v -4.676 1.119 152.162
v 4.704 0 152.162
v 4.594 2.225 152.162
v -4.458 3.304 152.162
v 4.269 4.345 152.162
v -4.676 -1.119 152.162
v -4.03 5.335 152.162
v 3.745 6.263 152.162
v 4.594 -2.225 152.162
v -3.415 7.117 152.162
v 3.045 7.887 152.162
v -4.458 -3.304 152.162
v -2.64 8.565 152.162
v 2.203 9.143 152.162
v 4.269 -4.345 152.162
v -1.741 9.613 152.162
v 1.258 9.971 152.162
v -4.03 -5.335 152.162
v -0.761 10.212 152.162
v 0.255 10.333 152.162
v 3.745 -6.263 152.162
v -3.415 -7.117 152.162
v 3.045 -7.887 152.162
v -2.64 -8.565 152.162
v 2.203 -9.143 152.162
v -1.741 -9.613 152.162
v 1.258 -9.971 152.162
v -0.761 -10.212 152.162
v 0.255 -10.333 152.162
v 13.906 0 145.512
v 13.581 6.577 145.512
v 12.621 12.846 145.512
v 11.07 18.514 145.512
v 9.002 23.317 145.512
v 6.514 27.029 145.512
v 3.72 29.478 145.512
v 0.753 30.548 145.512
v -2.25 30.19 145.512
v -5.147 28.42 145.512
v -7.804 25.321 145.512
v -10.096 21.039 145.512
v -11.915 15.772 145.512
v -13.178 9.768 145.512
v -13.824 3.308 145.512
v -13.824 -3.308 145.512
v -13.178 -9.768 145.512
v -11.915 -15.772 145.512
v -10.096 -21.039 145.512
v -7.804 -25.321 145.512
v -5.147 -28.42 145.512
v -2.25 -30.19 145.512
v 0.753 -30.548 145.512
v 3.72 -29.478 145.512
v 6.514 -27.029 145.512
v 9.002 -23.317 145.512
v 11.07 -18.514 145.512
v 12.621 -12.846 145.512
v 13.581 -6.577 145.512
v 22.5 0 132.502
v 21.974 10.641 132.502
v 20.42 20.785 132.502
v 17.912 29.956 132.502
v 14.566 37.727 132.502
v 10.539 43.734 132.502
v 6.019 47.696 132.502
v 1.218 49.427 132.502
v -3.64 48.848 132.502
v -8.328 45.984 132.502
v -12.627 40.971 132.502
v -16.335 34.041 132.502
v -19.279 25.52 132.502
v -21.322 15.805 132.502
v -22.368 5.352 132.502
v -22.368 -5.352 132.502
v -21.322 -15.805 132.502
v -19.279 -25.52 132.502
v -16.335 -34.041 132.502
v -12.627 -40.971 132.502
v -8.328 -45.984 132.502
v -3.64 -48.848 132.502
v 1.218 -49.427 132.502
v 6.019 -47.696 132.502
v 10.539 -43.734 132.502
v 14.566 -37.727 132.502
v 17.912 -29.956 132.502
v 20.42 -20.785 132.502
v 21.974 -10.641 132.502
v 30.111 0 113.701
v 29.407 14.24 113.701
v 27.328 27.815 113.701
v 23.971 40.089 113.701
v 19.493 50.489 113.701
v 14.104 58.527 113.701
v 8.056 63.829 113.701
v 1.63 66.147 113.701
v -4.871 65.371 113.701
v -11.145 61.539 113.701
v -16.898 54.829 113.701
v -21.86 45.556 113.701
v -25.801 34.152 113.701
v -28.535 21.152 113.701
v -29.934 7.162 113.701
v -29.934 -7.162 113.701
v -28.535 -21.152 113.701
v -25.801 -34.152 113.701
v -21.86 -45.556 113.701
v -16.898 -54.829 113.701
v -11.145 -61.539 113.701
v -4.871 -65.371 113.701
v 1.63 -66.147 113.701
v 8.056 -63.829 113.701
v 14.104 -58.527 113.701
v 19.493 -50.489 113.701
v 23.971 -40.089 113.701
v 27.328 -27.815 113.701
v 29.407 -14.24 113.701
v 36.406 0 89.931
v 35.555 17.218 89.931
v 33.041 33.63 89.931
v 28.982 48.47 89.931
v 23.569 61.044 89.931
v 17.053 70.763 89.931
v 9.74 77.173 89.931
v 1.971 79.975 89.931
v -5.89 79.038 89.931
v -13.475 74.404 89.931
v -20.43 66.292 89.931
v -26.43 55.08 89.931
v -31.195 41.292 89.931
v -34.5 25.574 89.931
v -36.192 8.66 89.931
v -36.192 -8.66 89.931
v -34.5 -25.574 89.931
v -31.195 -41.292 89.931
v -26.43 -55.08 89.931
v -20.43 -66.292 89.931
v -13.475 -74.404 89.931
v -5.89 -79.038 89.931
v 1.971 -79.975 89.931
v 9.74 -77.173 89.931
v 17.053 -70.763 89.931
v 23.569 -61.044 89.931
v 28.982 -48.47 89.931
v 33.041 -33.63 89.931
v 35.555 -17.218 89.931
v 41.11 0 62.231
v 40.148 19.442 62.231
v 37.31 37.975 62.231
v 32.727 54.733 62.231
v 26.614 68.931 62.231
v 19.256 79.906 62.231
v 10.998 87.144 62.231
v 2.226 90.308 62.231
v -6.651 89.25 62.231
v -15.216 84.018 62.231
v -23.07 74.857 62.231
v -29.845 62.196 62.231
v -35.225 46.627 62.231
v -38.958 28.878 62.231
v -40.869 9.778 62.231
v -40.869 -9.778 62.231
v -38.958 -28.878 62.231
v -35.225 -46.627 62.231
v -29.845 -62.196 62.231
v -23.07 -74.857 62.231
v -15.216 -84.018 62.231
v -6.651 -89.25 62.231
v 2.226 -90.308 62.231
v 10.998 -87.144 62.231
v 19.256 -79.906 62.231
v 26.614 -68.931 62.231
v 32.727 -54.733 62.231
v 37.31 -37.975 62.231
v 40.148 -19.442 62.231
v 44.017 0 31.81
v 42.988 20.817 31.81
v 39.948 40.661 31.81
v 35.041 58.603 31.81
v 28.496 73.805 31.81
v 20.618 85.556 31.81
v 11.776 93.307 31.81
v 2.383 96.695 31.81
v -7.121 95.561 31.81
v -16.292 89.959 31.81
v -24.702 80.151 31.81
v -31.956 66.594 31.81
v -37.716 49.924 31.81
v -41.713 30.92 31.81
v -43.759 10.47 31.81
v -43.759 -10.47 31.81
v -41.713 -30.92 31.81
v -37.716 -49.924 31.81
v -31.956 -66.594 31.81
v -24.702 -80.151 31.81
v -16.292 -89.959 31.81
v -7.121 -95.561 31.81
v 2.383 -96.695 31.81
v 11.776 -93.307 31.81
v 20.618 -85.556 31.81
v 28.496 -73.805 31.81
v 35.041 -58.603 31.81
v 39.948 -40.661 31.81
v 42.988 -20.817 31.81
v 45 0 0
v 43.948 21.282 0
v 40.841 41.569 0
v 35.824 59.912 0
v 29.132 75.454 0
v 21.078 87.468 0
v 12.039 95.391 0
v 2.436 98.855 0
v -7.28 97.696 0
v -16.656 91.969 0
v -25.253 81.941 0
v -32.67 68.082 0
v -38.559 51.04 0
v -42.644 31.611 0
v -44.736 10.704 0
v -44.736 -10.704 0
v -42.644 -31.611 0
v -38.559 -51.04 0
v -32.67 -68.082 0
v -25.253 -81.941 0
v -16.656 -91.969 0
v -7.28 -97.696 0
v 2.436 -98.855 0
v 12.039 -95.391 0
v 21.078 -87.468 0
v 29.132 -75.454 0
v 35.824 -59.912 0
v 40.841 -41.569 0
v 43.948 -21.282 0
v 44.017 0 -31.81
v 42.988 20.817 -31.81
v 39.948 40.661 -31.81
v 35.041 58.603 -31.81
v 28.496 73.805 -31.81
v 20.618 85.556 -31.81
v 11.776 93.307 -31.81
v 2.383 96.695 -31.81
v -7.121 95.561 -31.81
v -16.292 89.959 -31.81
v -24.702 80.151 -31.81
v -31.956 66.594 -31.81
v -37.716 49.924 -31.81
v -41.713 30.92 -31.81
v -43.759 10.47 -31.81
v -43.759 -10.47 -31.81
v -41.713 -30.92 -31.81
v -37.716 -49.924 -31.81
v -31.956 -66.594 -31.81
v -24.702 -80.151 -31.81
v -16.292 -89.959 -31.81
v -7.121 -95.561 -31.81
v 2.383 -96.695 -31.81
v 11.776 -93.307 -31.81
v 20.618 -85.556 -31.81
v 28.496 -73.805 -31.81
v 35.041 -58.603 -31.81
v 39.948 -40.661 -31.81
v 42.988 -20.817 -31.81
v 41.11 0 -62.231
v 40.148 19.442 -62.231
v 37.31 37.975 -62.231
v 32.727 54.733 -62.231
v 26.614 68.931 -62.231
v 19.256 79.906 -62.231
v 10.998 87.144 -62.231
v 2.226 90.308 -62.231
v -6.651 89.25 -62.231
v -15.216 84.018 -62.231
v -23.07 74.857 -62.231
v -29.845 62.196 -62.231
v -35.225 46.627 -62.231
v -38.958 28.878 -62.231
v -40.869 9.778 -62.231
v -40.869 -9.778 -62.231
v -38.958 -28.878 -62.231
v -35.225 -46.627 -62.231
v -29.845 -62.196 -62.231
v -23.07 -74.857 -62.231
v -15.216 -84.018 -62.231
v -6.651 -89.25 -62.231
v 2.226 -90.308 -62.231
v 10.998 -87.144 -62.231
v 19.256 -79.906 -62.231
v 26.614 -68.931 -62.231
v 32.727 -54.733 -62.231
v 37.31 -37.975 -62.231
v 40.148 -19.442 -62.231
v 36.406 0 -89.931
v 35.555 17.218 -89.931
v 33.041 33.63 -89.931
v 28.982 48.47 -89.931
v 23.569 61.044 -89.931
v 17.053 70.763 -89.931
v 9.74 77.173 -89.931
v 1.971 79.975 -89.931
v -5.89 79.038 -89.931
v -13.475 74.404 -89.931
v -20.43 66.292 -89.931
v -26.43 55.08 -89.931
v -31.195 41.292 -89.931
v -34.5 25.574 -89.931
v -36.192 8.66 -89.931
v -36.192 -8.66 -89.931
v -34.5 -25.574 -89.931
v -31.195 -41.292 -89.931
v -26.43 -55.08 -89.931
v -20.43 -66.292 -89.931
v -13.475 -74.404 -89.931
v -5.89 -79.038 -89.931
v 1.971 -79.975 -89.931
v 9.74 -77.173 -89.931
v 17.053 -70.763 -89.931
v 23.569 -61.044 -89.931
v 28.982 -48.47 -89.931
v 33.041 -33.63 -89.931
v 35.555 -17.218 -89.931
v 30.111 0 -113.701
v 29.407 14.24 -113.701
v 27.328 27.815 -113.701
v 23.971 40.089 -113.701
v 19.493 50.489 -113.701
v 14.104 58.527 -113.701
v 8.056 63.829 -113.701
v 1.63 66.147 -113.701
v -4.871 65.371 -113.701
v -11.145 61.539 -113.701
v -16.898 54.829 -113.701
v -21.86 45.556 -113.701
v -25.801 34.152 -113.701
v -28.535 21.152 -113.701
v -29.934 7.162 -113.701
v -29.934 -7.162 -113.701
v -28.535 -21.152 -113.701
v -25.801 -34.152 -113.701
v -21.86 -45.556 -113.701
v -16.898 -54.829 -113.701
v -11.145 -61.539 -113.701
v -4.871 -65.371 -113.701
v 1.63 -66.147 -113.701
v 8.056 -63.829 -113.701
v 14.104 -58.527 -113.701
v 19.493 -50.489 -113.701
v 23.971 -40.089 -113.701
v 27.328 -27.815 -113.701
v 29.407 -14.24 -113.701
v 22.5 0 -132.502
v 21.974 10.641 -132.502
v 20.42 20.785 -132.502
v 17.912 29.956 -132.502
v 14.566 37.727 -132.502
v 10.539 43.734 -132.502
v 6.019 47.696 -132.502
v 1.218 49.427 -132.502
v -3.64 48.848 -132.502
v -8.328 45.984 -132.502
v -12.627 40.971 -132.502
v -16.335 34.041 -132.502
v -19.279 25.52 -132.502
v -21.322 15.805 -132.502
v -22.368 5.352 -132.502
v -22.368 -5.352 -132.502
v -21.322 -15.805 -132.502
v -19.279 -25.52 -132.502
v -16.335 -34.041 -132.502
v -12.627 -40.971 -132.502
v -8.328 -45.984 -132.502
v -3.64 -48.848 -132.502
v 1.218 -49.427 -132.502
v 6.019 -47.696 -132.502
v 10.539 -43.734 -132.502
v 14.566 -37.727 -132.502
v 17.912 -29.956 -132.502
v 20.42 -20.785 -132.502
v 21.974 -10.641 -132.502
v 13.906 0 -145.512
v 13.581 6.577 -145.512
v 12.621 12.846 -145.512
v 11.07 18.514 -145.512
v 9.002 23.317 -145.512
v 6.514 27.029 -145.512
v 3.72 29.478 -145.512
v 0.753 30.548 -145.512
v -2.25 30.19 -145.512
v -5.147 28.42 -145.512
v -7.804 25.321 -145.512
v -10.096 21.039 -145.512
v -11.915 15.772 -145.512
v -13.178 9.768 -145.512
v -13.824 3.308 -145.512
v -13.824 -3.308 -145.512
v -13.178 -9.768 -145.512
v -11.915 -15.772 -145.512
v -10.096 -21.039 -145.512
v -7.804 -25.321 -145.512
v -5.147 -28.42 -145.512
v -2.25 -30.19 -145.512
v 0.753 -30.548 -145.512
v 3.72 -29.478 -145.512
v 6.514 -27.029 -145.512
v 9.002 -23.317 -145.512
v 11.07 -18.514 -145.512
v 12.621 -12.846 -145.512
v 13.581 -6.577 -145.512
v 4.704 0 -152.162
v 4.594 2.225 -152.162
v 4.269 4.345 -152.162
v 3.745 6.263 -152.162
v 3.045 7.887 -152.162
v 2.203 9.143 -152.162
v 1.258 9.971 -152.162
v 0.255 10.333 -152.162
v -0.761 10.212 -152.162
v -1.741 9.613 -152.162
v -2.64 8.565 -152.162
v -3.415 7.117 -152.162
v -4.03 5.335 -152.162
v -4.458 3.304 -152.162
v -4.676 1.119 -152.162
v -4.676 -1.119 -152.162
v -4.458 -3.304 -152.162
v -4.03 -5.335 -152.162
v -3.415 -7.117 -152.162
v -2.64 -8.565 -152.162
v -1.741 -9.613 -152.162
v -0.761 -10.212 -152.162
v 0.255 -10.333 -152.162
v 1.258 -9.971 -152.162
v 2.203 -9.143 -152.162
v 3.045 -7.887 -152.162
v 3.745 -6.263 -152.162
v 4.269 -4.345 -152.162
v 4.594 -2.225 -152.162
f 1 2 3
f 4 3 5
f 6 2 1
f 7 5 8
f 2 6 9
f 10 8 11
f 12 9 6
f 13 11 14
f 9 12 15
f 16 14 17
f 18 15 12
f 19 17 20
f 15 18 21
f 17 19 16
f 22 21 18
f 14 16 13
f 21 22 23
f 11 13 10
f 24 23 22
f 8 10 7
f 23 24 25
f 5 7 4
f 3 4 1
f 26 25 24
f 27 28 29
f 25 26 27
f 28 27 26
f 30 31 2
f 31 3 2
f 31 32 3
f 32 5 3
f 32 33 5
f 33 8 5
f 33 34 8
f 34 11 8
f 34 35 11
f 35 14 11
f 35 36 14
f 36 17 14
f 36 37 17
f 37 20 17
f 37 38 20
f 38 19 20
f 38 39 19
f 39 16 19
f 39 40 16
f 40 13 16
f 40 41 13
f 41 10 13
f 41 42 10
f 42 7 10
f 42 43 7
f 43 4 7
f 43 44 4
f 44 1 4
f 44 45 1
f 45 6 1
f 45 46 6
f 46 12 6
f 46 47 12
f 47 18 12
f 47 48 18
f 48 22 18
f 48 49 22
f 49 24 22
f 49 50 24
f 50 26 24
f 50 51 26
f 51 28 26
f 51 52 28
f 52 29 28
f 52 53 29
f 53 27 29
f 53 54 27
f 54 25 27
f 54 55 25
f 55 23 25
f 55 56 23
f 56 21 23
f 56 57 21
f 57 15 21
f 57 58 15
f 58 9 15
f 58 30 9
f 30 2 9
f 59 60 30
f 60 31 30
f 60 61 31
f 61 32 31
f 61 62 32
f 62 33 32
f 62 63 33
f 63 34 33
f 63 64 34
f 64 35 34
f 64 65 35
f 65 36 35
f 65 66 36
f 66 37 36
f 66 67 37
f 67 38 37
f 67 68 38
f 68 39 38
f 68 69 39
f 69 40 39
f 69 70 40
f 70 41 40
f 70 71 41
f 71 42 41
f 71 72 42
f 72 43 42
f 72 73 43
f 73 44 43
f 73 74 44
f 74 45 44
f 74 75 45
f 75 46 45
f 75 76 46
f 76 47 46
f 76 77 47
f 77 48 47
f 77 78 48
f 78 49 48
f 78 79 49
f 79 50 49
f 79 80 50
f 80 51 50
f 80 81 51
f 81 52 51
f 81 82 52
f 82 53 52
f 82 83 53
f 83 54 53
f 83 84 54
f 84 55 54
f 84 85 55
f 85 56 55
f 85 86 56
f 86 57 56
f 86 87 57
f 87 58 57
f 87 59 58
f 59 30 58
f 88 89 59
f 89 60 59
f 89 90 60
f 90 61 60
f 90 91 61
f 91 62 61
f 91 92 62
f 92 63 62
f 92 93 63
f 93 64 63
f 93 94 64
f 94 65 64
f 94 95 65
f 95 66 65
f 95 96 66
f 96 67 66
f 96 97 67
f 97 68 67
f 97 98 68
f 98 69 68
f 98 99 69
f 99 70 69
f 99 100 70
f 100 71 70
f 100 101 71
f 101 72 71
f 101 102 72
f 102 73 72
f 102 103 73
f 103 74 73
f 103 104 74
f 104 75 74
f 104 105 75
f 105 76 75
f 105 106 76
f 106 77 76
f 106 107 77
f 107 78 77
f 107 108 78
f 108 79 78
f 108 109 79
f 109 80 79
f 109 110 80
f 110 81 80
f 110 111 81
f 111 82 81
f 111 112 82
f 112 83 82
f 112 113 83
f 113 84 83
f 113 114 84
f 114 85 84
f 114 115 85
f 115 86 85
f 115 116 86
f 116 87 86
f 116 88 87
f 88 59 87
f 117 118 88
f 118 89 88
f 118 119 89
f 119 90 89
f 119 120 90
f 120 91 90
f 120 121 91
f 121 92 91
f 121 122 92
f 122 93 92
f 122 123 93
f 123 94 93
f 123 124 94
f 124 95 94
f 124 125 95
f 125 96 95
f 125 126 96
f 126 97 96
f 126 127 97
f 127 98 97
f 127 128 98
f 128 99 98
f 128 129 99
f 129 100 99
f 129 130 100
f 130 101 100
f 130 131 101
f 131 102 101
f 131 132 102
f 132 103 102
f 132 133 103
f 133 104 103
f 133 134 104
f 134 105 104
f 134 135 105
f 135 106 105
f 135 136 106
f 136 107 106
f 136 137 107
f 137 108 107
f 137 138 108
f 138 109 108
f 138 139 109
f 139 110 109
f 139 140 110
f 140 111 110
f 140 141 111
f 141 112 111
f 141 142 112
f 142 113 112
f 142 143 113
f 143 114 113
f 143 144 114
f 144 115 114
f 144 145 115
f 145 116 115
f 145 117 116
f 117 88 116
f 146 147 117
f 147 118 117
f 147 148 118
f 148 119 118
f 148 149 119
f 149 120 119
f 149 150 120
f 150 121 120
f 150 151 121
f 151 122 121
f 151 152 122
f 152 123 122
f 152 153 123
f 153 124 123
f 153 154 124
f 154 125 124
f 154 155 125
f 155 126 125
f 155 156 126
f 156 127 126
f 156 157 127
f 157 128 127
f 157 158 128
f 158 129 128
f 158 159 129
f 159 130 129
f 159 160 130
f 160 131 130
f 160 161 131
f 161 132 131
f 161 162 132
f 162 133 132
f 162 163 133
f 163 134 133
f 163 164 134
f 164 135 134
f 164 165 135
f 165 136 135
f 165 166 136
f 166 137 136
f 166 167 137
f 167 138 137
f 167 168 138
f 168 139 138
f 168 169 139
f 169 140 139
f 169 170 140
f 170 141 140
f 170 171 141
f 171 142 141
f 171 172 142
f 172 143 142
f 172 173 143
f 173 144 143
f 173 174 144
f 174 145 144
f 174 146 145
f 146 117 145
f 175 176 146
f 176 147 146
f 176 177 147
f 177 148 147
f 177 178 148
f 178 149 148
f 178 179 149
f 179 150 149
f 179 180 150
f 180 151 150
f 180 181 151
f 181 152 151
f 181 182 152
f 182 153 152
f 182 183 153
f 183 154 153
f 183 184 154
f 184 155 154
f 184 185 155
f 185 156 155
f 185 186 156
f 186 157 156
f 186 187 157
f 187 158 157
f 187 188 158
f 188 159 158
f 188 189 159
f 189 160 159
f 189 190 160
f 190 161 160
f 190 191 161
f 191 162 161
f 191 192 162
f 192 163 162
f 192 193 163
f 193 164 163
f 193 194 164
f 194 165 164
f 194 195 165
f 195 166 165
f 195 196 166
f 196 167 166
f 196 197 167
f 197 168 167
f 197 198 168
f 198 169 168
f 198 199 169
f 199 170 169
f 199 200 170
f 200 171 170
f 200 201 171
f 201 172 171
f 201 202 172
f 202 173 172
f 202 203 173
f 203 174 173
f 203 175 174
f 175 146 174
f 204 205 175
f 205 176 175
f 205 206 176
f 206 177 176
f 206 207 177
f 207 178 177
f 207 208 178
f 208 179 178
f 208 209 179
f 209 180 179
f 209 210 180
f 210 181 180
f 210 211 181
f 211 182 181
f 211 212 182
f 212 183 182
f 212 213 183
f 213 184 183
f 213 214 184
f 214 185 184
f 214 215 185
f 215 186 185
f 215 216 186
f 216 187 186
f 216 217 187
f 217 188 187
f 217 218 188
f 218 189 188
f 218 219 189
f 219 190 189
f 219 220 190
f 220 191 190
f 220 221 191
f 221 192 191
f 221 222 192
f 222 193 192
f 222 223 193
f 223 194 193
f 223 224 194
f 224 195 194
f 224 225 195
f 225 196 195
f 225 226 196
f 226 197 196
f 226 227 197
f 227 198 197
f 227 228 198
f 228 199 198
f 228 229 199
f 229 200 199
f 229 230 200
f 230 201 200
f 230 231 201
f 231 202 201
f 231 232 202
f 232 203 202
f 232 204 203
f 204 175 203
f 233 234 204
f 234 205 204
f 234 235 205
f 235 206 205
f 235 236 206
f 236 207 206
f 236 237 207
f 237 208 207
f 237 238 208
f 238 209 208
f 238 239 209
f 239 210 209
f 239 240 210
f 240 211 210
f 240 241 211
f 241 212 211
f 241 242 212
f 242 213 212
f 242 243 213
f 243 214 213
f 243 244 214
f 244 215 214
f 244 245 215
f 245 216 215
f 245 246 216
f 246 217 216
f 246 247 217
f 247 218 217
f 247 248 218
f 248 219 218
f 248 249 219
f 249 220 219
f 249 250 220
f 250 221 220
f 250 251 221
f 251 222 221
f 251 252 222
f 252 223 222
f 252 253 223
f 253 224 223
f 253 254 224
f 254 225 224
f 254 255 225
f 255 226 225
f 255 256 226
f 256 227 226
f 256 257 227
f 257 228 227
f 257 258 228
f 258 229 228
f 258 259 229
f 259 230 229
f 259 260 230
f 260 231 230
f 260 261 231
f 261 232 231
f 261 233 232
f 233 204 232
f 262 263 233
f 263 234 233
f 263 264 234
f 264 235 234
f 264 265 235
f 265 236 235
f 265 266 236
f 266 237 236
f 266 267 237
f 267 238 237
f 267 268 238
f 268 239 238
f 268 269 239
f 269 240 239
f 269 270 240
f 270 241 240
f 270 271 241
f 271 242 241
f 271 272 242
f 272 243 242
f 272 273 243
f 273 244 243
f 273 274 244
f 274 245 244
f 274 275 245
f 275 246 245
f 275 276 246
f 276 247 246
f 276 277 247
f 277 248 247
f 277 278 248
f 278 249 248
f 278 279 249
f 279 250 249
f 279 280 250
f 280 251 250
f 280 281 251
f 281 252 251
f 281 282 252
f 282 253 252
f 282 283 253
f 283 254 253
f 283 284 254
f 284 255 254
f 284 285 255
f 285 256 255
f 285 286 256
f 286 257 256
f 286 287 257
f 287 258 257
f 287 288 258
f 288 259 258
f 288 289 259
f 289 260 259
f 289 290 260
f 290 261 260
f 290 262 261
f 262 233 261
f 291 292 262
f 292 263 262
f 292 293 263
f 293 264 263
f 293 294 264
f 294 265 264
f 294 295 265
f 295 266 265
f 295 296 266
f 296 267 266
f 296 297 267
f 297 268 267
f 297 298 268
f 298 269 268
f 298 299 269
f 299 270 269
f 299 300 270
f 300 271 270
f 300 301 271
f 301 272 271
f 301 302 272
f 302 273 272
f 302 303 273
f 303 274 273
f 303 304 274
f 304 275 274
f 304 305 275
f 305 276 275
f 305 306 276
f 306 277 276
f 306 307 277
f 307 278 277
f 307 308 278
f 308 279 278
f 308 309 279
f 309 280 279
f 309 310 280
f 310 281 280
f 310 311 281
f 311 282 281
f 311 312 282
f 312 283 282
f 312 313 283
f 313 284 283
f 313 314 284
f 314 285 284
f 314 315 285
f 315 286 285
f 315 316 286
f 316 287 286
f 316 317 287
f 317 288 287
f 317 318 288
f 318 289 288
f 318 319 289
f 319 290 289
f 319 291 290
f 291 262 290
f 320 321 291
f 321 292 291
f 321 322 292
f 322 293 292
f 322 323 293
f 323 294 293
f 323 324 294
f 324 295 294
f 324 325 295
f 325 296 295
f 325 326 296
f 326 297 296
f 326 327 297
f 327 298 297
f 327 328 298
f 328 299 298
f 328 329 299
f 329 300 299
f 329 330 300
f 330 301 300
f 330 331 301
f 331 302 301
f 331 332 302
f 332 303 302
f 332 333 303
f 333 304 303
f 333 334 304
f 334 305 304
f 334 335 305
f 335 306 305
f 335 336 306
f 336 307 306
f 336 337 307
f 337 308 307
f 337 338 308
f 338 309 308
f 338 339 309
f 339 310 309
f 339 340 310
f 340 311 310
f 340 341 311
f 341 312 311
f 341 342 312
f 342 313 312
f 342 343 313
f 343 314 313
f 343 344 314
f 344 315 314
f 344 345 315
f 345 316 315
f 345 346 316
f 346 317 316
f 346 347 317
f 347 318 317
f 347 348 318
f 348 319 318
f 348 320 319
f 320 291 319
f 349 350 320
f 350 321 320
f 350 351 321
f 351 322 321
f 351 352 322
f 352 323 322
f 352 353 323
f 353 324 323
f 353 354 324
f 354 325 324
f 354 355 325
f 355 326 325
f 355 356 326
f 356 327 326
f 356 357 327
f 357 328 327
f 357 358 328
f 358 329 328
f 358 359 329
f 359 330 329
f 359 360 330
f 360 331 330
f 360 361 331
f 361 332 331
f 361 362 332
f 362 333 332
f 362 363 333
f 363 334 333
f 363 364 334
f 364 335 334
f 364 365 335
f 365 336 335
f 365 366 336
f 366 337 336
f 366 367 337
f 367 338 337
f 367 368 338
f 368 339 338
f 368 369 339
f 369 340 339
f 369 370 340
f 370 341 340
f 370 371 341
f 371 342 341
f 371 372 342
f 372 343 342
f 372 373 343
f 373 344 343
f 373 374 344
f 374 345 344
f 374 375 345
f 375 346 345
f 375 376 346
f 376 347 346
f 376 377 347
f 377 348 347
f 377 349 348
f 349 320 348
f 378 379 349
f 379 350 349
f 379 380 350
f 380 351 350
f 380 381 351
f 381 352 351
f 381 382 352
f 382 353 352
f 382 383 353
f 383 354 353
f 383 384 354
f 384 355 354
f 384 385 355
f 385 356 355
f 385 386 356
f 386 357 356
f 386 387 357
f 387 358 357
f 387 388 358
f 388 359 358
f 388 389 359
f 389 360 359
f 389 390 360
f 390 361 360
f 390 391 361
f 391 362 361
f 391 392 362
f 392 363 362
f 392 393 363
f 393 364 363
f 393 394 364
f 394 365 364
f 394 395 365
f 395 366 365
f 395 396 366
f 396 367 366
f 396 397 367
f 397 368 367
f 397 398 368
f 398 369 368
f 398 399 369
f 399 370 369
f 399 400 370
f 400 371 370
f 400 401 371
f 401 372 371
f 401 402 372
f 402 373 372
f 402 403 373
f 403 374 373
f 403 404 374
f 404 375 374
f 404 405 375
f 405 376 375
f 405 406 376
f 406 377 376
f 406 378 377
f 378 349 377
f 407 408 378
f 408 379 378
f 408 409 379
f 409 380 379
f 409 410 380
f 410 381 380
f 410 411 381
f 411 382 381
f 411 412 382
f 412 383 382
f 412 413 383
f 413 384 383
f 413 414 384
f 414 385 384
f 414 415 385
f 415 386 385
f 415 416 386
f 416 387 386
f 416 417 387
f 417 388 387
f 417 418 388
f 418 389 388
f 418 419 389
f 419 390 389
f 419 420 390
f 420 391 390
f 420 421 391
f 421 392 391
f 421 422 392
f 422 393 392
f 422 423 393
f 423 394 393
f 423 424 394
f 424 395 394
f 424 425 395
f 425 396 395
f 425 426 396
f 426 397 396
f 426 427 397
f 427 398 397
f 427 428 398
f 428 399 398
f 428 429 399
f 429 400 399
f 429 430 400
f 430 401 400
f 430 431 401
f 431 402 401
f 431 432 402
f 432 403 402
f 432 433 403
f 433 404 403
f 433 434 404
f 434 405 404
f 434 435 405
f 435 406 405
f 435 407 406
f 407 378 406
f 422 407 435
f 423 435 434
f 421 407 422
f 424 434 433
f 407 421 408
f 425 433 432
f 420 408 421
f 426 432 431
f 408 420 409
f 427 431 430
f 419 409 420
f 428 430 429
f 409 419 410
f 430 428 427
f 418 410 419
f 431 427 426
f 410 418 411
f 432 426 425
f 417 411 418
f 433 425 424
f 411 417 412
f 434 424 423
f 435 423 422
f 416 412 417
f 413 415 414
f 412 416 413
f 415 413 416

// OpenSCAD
// Generated by SolidPython 1.0.1 on 2020-07-29 00:46:46


scale(v = [5, 11, 17]) {
	sphere(r = 9);
}
/***********************************************
*********      SolidPython code:      **********
************************************************
 
# import packages: SolidPython
from solid import *
from solid.utils import *
from itertools import chain, combinations, permutations


class Resize:

    def __init__(self, scad_file):
        self.scad_file = scad_file
        #self.scad_file = import_scad(scad_file)
        # cone/cylinder param:
        self.r1 = 0
        self.r2 = 0
        self.h = 0
        # rectangular prism param:
        self.w = 0
        self.l = 0
        # ellipse param:
        self.r = 0

    # import OpenScad code (file name corresponds to shape)


    # classify shape + parameters
    def assign(self, param1, param2, param3):
        if self.scad_file == 'cone.scad':
            self.r1 = param1
            self.r2 = param2
            self.h = param3
        elif self.scad_file == 'cylinder.scad':
            self.r1 = param1
            self.r2 = param2
            self.h = param3
        elif self.scad_file == 'rectangularPrism.scad':
            self.h = param1
            self.l = param2
            self.w = param3
        else:
            self.r = param1
            self.h = param2

    # resize parameters
    def iterate(self):
        x = range(3, 20, 2)
        i = 1
        if self.scad_file == 'cone.scad':
            tempList = list(permutations(x, 2))
            for temp in tempList:
                param1 = temp[0]
                param2 = temp[1]
                filepath = 'produced_scad_files/' + 'cone' + str(param1) + '_' + str(param2) + '_' + '.scad'
                scad_render_to_file(cylinder(h=param1, r1=param2, r2=0), filepath)

        elif self.scad_file == 'cylinder.scad':
            tempList = list(permutations(x, 3))
            for temp in tempList:
                param1 = temp[0]
                param2 = temp[1]
                filepath = 'produced_scad_files/' + 'cylinder' + str(param1) + '_' + str(param2) + '_' + '.scad'
                scad_render_to_file(cylinder(h=param1, r1=param2, r2=param2), filepath)

        elif self.scad_file == 'rectangularPrism.scad':
            tempList = list(permutations(x, 3))
            for temp in tempList:
                param1 = temp[0]
                param2 = temp[1]
                param3 = temp[2]
                filepath = 'produced_scad_files/' + 'rectangularPrism' + str(param1) + '_' + str(param2) + '_' + str(
                    param3) + '.scad'
                scad_render_to_file(cube(size=(param1, param2, param3)), filepath)

        elif self.scad_file == 'ellipse.scad':
            tempList = list(permutations(x, 4))
            for temp in tempList:
                param1 = temp[0]
                param2 = temp[1]
                param3 = temp[2]
                param4 = temp[3]
                filepath = 'produced_scad_files/' + 'ellipse' + str(param1) + '_' + str(param2) + '_' + str(param3) + '_' + str(param4) + '.scad'
                scad_render_to_file(scale([param1, param2, param3])(sphere(r=param4)), filepath)

    def render_to_scadfile(self):
        scad_render_to_file(scad, 'example.scad') 
 
************************************************/
